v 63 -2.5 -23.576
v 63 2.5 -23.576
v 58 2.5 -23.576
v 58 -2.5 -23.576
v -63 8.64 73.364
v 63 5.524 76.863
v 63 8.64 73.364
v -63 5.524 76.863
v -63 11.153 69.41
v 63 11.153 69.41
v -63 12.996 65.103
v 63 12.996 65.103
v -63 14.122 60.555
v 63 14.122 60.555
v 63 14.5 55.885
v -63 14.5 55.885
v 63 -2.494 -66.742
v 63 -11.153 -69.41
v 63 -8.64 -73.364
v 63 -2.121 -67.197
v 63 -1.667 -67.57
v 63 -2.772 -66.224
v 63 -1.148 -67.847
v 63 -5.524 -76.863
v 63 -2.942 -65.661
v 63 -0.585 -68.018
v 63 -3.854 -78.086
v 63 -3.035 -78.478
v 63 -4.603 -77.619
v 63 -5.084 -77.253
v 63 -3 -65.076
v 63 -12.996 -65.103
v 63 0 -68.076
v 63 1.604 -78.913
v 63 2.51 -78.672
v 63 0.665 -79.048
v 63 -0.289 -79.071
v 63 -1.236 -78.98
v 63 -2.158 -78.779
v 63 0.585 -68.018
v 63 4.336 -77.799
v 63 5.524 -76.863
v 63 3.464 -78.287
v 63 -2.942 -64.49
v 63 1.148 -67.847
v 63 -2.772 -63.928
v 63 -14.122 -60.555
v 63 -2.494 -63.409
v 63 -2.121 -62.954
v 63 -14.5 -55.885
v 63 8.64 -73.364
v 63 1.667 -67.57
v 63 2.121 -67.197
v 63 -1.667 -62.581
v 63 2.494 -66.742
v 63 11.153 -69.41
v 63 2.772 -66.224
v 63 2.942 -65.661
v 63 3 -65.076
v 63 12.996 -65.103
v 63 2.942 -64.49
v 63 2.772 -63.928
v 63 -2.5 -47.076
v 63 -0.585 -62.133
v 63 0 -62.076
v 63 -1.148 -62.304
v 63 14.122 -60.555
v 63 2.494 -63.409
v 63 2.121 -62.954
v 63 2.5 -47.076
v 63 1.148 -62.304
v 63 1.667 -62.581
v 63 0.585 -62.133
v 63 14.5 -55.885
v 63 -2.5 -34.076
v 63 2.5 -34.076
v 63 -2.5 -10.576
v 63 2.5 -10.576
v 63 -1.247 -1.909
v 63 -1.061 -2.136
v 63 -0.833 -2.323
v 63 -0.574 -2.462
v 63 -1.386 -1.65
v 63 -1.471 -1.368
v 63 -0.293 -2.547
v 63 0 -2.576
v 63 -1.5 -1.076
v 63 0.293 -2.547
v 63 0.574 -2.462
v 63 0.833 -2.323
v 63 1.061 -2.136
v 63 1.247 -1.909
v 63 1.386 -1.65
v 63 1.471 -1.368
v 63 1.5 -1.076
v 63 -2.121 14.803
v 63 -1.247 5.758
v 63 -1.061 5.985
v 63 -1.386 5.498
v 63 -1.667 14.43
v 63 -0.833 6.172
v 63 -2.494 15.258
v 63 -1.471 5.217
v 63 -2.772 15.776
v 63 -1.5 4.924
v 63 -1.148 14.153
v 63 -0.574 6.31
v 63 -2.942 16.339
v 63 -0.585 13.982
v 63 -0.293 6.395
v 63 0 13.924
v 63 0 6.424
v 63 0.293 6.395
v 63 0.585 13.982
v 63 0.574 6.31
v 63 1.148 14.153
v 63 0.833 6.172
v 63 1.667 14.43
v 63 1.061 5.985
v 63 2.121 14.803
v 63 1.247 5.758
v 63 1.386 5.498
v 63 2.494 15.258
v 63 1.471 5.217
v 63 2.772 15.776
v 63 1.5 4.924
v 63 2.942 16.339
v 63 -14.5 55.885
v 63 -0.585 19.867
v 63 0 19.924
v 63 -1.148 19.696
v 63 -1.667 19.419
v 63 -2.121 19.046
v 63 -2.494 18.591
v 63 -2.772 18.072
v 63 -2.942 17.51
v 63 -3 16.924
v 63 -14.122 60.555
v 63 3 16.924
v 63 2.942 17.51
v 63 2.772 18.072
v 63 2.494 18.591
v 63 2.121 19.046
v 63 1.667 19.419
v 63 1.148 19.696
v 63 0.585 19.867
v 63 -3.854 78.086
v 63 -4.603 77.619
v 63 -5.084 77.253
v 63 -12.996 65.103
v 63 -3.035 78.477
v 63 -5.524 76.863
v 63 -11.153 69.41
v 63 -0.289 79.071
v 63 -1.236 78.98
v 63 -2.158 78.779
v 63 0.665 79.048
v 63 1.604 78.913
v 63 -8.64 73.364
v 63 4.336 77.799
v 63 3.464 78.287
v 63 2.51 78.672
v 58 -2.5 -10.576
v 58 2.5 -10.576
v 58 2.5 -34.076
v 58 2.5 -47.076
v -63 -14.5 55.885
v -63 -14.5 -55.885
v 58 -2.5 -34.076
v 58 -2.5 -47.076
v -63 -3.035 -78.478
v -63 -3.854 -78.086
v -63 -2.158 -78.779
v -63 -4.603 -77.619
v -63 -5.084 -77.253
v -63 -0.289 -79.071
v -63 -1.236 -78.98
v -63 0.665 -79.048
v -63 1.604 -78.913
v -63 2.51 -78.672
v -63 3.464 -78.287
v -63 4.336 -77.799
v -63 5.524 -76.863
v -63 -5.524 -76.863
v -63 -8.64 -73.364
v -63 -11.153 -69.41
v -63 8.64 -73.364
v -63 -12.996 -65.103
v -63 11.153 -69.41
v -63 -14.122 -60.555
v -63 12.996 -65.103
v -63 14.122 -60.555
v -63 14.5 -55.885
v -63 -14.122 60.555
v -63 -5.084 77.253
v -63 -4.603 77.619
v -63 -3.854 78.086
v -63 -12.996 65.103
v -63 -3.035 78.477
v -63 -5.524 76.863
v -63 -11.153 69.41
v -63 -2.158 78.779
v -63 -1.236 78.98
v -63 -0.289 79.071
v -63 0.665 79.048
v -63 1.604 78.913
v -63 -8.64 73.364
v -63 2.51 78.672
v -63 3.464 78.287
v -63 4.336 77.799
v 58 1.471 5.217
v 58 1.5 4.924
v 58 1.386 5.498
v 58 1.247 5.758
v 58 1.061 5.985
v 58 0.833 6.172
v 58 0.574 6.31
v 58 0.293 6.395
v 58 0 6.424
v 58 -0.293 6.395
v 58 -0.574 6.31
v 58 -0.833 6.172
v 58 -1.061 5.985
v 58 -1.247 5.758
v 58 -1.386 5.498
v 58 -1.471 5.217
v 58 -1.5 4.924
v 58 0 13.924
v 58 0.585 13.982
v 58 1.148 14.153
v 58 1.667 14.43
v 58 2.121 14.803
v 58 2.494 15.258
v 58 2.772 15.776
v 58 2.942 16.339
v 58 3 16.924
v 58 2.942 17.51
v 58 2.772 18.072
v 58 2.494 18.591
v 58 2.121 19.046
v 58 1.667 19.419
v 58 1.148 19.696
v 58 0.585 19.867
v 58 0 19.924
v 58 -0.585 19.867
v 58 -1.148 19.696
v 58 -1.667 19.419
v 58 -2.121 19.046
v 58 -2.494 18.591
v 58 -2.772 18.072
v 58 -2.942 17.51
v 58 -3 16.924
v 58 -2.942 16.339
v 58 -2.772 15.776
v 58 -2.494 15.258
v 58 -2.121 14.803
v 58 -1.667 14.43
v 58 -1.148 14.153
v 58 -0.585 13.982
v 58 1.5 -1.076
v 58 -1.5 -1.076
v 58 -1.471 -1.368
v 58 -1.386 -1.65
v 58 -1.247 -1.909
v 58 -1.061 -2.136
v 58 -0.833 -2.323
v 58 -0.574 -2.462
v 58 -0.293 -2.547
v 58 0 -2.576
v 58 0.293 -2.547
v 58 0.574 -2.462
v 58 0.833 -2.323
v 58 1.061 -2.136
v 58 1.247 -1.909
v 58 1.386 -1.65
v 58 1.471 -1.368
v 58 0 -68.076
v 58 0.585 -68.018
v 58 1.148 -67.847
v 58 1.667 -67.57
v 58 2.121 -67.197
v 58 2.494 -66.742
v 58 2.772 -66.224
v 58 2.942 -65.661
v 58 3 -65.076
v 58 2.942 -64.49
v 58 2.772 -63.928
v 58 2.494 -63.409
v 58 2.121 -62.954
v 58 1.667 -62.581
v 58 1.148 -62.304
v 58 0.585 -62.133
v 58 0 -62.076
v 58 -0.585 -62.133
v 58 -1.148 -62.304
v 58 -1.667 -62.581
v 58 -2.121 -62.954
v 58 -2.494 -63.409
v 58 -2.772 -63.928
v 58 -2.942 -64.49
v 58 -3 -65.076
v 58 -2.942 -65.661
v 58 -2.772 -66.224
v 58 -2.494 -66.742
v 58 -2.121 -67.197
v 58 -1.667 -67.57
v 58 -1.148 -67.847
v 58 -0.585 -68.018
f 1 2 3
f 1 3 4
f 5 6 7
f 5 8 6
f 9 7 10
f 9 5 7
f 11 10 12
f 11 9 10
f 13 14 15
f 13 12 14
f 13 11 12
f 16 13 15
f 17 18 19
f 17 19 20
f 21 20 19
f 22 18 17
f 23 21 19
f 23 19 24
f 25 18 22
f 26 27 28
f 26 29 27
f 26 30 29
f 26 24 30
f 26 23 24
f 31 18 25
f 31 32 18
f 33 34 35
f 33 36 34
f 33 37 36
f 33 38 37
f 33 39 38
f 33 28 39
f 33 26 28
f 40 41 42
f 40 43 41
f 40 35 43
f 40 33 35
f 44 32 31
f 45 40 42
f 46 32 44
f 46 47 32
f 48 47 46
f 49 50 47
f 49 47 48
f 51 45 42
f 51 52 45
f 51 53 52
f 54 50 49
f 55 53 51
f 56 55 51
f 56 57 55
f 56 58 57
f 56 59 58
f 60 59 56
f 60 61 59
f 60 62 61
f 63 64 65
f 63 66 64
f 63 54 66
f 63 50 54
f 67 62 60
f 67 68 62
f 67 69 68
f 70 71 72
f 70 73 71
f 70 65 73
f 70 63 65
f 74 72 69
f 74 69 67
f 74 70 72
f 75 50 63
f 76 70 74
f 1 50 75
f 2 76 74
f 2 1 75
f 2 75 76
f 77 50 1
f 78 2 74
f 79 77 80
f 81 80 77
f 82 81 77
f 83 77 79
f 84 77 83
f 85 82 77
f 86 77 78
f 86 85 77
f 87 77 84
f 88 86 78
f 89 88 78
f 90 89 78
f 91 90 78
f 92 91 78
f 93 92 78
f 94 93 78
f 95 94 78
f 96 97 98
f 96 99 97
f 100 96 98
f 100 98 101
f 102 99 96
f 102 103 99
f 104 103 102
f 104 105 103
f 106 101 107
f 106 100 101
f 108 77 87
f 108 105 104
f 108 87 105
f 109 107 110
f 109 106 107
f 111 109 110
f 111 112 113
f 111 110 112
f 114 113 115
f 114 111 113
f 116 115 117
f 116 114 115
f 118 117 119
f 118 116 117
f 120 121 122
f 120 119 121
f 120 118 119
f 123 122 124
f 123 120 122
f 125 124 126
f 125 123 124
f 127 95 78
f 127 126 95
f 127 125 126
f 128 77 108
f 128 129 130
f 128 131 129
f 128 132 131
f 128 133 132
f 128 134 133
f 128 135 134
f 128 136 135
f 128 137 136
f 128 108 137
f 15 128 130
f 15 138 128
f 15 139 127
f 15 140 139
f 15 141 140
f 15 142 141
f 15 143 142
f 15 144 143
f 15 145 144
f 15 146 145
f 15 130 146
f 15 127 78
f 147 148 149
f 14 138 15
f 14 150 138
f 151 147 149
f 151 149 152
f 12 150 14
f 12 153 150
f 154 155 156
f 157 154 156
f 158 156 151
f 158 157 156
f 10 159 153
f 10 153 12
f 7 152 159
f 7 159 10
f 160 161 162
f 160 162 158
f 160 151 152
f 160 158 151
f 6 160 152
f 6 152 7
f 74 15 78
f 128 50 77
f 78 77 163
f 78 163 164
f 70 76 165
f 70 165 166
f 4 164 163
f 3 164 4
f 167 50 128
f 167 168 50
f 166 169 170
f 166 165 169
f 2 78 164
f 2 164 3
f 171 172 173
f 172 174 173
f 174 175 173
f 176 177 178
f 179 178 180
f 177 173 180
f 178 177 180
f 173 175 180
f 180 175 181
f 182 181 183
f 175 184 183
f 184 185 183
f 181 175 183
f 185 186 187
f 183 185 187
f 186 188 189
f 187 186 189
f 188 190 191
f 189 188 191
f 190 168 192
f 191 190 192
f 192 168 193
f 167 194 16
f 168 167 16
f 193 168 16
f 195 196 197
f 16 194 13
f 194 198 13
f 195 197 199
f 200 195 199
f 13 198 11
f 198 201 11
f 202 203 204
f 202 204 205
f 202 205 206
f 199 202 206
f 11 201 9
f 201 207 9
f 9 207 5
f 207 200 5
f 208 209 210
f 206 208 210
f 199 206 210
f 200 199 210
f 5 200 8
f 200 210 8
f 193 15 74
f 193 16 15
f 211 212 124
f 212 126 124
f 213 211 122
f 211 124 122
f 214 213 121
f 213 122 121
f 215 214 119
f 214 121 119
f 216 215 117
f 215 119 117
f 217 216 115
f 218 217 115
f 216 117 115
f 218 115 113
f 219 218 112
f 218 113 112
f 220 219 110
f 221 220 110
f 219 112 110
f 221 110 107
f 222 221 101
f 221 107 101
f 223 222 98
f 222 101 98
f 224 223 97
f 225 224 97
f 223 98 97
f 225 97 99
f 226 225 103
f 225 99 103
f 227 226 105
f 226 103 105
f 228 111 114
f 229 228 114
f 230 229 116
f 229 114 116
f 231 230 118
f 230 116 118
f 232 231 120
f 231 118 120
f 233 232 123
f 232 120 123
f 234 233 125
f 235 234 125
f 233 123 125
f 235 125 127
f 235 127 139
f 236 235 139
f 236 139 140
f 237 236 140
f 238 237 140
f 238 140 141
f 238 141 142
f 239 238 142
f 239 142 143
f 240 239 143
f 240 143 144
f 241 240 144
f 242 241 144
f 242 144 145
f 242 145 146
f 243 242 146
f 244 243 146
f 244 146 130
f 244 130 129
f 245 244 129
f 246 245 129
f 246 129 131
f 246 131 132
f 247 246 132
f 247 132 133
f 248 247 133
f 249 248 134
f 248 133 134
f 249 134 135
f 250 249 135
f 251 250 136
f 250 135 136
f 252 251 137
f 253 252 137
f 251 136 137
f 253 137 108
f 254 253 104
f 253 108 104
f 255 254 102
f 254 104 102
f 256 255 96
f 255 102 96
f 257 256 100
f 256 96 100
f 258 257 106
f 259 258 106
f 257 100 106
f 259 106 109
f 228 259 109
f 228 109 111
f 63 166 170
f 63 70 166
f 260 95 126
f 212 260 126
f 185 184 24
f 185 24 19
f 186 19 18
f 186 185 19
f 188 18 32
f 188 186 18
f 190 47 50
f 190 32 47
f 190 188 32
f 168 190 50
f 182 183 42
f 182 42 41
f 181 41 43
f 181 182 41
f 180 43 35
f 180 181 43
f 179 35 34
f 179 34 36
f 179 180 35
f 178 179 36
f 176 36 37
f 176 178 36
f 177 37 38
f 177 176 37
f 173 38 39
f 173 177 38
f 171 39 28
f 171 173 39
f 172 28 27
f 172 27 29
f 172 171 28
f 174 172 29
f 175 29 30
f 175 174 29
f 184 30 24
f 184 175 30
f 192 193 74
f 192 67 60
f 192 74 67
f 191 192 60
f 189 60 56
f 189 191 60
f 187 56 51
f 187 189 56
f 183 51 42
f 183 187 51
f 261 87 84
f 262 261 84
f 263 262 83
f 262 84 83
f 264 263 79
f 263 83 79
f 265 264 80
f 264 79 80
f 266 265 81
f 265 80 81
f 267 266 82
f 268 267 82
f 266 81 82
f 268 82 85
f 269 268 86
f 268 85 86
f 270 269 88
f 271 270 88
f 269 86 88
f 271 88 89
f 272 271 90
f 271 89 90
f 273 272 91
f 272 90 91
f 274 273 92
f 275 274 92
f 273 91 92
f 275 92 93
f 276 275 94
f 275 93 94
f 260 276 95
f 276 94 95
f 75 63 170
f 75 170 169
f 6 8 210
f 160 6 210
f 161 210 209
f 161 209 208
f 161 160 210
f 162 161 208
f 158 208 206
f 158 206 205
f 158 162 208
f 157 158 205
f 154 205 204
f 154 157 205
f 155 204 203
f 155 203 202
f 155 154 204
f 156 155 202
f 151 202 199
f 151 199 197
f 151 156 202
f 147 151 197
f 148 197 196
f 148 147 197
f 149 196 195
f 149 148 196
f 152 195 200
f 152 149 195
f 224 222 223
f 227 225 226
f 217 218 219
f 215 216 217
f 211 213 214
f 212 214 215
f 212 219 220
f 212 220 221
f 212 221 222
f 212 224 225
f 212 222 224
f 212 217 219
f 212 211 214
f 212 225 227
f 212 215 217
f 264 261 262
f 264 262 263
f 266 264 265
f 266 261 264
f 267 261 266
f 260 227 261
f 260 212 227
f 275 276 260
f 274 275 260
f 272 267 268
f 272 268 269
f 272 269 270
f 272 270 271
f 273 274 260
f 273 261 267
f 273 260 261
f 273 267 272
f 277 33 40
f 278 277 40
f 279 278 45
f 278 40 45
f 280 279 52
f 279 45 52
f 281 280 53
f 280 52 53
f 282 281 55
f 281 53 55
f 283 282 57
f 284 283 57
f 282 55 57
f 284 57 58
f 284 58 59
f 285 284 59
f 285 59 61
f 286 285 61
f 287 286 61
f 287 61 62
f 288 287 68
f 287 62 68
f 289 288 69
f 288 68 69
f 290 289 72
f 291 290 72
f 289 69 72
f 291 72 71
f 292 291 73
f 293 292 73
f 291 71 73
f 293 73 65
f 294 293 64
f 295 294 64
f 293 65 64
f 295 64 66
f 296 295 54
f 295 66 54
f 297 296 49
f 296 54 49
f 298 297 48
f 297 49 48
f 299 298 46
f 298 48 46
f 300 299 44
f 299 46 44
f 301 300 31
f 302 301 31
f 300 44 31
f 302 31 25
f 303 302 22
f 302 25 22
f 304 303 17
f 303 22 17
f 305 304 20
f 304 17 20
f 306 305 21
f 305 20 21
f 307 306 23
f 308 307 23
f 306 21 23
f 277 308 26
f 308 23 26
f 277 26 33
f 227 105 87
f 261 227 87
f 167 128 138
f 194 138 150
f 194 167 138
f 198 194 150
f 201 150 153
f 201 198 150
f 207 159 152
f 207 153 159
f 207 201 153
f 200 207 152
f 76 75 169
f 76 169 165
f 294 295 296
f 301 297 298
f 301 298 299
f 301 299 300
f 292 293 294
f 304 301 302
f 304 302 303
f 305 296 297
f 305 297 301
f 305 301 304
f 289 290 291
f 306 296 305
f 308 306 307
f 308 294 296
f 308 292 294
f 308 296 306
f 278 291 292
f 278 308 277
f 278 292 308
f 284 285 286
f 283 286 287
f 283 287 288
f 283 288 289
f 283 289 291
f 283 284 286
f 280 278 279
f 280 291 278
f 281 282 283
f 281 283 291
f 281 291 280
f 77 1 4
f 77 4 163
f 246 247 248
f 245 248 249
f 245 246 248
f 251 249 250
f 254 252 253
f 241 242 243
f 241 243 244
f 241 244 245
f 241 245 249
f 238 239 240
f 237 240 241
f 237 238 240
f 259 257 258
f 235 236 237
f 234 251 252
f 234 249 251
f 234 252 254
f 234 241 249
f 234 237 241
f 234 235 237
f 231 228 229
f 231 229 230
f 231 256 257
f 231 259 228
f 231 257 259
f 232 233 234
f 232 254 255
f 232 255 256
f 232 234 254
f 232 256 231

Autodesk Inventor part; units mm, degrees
ref_plane "YZ Plane" through (0, 0, 0) normal (1, 0, 0) x (0, 1, 0)
ref_plane "XZ Plane" through (0, 0, 0) normal (0, 1, 0) x (-1, 0, 0)
ref_plane "XY Plane" through (0, 0, 0) normal (0, 0, 1) x (1, 0, 0)
sketch "スケッチ1" plane through (0, 0, 0) normal (1, 0, 0) x (0, 1, 0)
  line L0 (-14.5, 81) -> (14.5, 81)
  line L1 (14.5, 81) -> (14.5, -81)
  line L2 (14.5, -81) -> (-14.5, -81)
  line L3 (-14.5, -81) -> (-14.5, 81)
  line L4 (-14.5, 81) -> (14.5, -81) construction
  line L5 (14.5, 81) -> (-14.5, -81) construction
  arc A0 (14.5, 55.8853) -> (0, 81) centre (-14.5, 55.8853) ccw
  arc A1 (0, 81) -> (-14.5, 55.8853) centre (14.5, 55.8853) ccw
  arc A2 (0, -81) -> (14.5, -55.8853) centre (-14.5, -55.8853) ccw
  arc A3 (-14.5, -55.8853) -> (0, -81) centre (14.5, -55.8853) ccw
  point P0 (0, 0)
  dimension "d0" = 29
  dimension "d1" = 162
extrude "押し出し1" add sketch "スケッチ1" along normal mid plane 126 contours A0 L1 A2 A3 L3 A1
fillet "フィレット1" radius 8 2 edges at (0, 0, 81) (0, 0, -81)
sketch "スケッチ2" plane through (63, 0, 0) normal (1, 0, 0) x (0, 0, -1)
  arc A0 (-76.8626, 5.5238) -> (-76.8626, -5.5238) centre (-71.0757, 0) ccw projected
  arc A1 (76.8626, -5.5238) -> (76.8626, 5.5238) centre (71.0757, 0) ccw projected
  line L0 (-71.0757, 0) -> (71.0757, 0) construction
  circle A2 centre (65.0757, 0) radius 3
  circle A3 centre (-16.9243, 0) radius 3
  line L1 (34.0757, 2.5) -> (47.0757, 2.5)
  line L2 (47.0757, 2.5) -> (47.0757, -2.5)
  line L3 (47.0757, -2.5) -> (34.0757, -2.5)
  line L4 (34.0757, -2.5) -> (34.0757, 2.5)
  line L5 (34.0757, 2.5) -> (47.0757, -2.5) construction
  line L6 (47.0757, 2.5) -> (34.0757, -2.5) construction
  line L7 (10.5757, 2.5) -> (23.5757, 2.5)
  line L8 (23.5757, 2.5) -> (23.5757, -2.5)
  line L9 (23.5757, -2.5) -> (10.5757, -2.5)
  line L10 (10.5757, -2.5) -> (10.5757, 2.5)
  line L11 (10.5757, 2.5) -> (23.5757, -2.5) construction
  line L12 (23.5757, 2.5) -> (10.5757, -2.5) construction
  line L13 (-4.9243, 0) -> (1.0757, 0) construction
  line L14 (-4.9243, -1.5) -> (1.0757, -1.5)
  line L15 (1.0757, 1.5) -> (-4.9243, 1.5)
  arc A4 (-4.9243, 1.5) -> (-4.9243, -1.5) centre (-4.9243, 0) ccw
  arc A5 (1.0757, -1.5) -> (1.0757, 1.5) centre (1.0757, 0) ccw
  point P0 (0, 0)
  point P1 (40.5757, 0)
  point P2 (17.0757, 0)
  point P3 (40.5757, 0)
  point P4 (17.0757, 0)
  point P5 (-1.9243, 0)
  point P6 (0, 0)
  dimension "d5" = 6
  dimension "d6" = 6
  dimension "d7" = 6
  dimension "d8" = 88
  dimension "d9" = 13
  dimension "d10" = 5
  dimension "d11" = 13
  dimension "d12" = 5
  dimension "d13" = 24.5
  dimension "d14" = 48
  dimension "d15" = 73
  dimension "d16" = 1.5
  dimension "d18" = 6
extrude "押し出し2" cut sketch "スケッチ2" against normal blind 5
properties part number "batter_krisdonia"
